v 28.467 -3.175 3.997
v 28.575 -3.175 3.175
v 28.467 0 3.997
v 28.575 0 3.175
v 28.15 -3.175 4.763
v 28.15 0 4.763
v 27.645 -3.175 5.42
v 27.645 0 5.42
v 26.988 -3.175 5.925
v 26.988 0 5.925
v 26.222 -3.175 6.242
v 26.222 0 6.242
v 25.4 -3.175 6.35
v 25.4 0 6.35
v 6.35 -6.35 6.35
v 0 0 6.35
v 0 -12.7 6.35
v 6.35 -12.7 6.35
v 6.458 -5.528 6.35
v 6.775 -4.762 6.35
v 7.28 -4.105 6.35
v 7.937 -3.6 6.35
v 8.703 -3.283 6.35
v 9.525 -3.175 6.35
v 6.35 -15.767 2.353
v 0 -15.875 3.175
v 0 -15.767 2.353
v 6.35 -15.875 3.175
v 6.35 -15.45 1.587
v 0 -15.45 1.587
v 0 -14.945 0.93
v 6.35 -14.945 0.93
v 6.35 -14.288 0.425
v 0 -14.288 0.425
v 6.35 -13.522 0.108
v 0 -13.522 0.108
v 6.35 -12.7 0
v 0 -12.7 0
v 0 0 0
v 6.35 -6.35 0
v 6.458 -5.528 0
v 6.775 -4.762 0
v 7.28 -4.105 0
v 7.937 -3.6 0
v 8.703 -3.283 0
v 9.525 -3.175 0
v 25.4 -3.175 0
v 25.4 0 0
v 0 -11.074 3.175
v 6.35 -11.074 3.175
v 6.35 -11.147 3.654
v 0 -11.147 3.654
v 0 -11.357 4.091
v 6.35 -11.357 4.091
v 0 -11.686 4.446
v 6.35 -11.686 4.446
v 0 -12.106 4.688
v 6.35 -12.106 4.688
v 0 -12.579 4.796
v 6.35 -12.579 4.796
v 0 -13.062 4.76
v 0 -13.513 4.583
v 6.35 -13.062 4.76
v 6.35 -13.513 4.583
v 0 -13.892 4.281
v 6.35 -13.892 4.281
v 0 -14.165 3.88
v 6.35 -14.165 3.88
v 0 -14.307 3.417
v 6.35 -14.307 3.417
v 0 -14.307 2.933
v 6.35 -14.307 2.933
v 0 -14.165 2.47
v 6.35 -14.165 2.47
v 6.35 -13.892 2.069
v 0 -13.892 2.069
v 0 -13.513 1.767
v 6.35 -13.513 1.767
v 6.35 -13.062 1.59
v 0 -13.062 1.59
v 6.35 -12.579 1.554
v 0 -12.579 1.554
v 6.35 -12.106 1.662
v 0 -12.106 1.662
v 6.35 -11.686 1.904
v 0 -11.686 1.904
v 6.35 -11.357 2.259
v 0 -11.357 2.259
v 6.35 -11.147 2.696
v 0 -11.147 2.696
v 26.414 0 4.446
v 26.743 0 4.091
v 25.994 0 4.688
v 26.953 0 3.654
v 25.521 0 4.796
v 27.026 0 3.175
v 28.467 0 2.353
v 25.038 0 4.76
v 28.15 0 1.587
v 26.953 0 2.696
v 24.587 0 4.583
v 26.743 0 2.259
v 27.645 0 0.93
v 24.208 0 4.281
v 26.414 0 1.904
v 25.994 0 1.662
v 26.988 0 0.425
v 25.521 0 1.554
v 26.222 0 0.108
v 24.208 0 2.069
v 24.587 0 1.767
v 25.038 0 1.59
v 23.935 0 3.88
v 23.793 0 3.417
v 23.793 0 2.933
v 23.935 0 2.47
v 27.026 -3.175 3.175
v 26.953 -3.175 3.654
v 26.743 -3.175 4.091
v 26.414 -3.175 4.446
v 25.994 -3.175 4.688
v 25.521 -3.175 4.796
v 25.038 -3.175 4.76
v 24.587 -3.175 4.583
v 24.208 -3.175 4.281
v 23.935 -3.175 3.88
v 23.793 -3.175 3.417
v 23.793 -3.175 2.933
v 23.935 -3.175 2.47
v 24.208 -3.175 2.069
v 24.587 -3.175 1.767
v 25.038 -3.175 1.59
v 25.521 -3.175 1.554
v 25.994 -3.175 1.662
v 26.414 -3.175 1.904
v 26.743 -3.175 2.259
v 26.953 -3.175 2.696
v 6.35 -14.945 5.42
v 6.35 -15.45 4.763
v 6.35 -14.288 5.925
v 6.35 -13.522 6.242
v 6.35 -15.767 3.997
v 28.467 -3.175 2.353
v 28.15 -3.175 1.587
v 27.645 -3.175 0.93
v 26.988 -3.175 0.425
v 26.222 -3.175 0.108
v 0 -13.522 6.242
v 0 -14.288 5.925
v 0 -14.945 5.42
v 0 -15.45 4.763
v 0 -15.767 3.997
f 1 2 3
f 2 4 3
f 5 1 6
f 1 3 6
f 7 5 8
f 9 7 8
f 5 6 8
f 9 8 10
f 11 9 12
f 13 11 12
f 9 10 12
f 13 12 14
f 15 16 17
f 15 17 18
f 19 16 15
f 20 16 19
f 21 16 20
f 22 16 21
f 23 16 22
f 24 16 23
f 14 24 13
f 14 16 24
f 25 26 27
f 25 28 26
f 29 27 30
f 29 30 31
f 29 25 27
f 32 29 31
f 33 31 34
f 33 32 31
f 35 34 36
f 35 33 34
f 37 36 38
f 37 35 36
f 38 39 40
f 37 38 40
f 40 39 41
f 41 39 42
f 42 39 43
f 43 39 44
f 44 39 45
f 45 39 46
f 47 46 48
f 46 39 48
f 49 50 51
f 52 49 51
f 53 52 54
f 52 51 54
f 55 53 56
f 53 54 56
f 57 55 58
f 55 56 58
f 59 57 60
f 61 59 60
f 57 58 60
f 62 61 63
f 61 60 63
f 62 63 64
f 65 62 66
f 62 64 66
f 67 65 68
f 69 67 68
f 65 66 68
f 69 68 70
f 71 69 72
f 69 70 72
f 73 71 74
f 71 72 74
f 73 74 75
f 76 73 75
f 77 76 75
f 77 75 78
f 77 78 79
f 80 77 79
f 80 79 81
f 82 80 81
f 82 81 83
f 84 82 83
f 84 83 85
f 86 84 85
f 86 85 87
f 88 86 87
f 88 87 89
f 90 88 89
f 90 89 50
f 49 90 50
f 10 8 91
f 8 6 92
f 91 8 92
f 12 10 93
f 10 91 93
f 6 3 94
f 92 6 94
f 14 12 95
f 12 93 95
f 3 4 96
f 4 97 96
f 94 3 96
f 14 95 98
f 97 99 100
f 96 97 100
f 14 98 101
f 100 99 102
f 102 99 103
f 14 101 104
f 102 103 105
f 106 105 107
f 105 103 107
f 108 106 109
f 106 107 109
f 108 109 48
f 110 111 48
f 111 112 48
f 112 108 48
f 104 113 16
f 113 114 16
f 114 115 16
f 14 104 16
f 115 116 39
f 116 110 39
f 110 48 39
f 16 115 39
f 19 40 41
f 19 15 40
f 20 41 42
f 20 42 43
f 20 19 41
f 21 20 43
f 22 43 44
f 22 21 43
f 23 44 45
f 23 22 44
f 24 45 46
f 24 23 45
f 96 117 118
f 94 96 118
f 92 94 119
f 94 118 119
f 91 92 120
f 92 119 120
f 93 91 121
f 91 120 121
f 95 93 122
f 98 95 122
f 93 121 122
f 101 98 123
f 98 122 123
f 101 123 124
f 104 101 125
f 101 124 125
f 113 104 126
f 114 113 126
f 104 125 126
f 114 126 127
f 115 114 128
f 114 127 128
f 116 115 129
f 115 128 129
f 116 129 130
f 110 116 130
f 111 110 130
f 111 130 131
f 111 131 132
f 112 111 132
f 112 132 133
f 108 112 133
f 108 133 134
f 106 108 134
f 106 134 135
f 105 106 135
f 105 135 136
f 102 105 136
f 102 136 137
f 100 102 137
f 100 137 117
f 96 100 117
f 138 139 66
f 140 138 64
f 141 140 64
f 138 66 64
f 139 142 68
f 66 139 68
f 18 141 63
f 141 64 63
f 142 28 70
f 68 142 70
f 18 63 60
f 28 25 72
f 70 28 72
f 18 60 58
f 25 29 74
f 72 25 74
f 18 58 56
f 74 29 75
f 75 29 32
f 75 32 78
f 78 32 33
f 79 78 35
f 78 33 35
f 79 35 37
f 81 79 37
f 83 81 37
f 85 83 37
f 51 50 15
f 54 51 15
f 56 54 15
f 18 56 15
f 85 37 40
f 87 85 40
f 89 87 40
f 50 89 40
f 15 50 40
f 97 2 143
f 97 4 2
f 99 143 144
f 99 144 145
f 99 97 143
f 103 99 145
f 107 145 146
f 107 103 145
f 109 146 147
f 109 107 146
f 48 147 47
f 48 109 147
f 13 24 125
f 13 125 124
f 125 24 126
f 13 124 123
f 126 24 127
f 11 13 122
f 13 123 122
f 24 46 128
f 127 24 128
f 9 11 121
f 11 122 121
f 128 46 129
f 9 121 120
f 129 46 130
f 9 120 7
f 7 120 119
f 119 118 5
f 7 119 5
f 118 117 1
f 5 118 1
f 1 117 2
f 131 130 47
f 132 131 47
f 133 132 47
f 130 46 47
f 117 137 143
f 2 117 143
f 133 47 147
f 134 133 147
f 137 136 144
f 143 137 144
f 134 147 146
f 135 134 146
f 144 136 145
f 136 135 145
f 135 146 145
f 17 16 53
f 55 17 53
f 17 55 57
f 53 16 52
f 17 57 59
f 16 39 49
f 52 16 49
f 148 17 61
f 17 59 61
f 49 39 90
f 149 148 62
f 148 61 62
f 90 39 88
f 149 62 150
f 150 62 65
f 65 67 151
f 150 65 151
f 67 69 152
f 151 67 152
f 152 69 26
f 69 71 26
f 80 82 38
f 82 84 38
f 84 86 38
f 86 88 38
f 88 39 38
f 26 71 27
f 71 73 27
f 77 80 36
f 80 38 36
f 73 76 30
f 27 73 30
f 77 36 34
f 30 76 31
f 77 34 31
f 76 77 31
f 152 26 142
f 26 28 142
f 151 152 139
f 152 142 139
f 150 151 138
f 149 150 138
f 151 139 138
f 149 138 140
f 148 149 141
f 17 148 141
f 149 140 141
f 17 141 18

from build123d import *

# Parameters (mm, degrees)
F1_DEPTH = 6.35
F2_R     = 3.17499
F3_R     = 1.6256
F4_DEPTH = 6.351
F5_R     = 1.6256
F6_DEPTH = 3.176


# Not quite as in the source:
# - a fillet or chamfer is up to 0.001 mm smaller than in the source, because OpenCascade refuses the exact size


with BuildPart() as f1:
    # F0 (on Top) → F1 (new body)
    with BuildSketch(Plane.XY):
        Polygon((0, 0), (0, -15.875), (6.35, -15.875), (6.35, -3.175), (28.575, -3.175), (28.575, 0), align=None)
    extrude(amount=F1_DEPTH)

    # F2 (radius 3.175 in the source; OpenCascade refuses exactly that, so slightly less here)
    f2_edges = [f1.edges().sort_by_distance(p)[0] for p in [
        (3.175, -15.875, 6.35),
        (3.175, -15.875, 0),
        (28.575, -1.5875, 6.35),
        (28.575, -1.5875, 0),
        (6.35, -3.175, 3.175),
    ]]
    fillet(f2_edges, radius=F2_R)

    # F3 (on face) → F4 (cut, through all)
    with BuildSketch(Plane.YZ.offset(6.35)):
        with Locations((-12.7, 3.175)):
            Circle(F3_R)
    extrude(amount=-F4_DEPTH, mode=Mode.SUBTRACT)

    # F5 (on face) → F6 (cut, through all)
    with BuildSketch(Plane.XZ.offset(3.175)):
        with Locations((25.4, 3.175)):
            Circle(F5_R)
    extrude(amount=-F6_DEPTH, mode=Mode.SUBTRACT)


solid = f1.part
